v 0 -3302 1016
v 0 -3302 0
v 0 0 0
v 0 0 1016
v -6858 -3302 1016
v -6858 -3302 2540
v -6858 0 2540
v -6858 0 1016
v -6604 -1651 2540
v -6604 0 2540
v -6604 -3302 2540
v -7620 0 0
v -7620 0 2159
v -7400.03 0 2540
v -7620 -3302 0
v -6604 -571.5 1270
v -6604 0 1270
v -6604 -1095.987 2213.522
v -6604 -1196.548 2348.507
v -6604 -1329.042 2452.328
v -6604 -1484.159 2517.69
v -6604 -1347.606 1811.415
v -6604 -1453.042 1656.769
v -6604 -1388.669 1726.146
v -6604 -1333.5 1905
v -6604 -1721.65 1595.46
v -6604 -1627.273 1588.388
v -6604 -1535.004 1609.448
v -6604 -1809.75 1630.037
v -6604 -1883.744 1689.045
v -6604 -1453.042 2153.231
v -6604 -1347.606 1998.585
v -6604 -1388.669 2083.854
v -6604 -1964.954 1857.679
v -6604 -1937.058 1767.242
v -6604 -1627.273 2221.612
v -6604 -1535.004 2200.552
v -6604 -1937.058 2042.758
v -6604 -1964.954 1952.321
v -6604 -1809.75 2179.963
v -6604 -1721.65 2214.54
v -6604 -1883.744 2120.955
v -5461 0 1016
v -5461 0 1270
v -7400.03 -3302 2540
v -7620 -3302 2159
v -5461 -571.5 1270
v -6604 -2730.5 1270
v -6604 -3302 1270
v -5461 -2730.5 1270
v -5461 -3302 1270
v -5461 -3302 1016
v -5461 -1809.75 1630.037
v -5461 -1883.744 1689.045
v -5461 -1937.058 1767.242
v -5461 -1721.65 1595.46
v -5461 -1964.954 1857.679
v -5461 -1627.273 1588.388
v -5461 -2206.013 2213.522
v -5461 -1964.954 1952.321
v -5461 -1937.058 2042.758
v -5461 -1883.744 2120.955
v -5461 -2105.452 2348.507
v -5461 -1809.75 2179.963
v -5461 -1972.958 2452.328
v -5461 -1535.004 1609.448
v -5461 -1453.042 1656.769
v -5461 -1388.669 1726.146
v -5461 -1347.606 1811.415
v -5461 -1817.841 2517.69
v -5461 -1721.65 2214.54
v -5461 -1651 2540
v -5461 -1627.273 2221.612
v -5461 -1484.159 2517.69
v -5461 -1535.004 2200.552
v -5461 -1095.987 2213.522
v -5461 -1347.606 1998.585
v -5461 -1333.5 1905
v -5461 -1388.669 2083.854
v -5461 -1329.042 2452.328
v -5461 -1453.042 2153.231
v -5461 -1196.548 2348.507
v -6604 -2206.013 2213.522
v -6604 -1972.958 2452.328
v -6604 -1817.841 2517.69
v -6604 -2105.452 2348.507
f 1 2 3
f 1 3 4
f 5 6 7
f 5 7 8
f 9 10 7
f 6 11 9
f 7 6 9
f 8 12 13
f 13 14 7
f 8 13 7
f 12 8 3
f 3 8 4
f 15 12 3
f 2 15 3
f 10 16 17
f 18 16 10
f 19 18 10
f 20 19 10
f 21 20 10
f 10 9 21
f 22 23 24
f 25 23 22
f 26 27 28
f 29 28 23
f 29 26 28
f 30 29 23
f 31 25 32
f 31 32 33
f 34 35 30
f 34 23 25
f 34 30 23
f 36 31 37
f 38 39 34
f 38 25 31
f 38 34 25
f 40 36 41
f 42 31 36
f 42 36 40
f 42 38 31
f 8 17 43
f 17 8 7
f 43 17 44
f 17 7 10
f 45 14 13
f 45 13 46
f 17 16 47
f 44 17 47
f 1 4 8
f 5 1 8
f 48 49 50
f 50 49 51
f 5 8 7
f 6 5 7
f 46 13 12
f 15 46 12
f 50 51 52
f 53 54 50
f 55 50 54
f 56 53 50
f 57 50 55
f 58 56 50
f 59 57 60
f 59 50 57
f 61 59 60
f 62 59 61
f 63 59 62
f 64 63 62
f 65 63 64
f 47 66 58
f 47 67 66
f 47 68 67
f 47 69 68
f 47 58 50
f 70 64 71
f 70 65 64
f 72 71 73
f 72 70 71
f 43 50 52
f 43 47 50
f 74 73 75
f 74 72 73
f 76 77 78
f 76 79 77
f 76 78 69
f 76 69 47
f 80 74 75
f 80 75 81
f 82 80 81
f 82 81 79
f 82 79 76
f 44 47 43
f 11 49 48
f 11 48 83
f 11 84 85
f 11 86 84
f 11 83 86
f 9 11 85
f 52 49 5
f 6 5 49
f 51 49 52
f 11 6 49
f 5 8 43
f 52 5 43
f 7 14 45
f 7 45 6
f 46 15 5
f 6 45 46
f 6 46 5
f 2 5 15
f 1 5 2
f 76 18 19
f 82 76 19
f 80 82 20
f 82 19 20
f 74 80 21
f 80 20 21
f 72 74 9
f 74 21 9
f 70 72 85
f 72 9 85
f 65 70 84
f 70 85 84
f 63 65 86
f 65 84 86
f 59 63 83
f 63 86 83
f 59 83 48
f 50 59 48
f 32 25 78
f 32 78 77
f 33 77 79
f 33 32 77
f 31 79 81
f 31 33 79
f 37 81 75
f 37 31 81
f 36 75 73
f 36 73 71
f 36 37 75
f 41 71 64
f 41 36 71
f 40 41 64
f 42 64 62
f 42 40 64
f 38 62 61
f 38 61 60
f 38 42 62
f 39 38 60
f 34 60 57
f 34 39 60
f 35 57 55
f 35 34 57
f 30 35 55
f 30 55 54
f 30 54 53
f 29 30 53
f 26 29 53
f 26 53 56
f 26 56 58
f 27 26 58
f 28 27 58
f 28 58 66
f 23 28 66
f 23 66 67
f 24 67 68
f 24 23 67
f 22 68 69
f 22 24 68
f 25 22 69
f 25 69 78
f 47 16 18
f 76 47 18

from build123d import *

# Parameters (mm, degrees)
F0_W     = 762
F0_H     = 1524
F1_DEPTH = 3302
F2_SIZE2 = 219.9704525612
F2_SIZE  = 381
F3_W     = 1143
F3_H     = 254
F4_DEPTH = 3302
F5_R     = 317.5
F6_DEPTH = 1143


with BuildPart() as f1:
    # F0 (on Front) → F1 (new body)
    with BuildSketch(Plane.XZ):
        Polygon((-7620, 0), (0, 0), (0, 1016), (-6858, 1016), (-7620, 1016), align=None)
        with Locations((-7239, 1778)):
            Rectangle(F0_W, F0_H)
    extrude(amount=F1_DEPTH)

    # F2
    f2_edges = [f1.edges().sort_by_distance(p)[0] for p in [
        (-7620, -1651, 2540),
    ]]
    f2_side = f1.faces().sort_by_distance((-7620, -1651, 1270))[0]
    chamfer(f2_edges, length=F2_SIZE, length2=F2_SIZE2, reference=f2_side)


with BuildPart() as f4:
    # F3 (on face) → F4 (new body)
    with BuildSketch(Plane.XZ.offset(3302)):
        Polygon((-6604, 2540), (-6858, 2540), (-6858, 1016), (-6604, 1016), (-6604, 1270), align=None)
        with Locations((-6032.5, 1143)):
            Rectangle(F3_W, F3_H)
    extrude(amount=-F4_DEPTH)

    # F5 (on face) → F6 (join)
    with BuildSketch(Plane.YZ.offset(-6604)):
        with BuildLine():
            ThreePointArc((-1095.9871465296, 2213.5218508997), (-1036.3219696647, 2064.3609708277), (-1016, 1905))
            ThreePointArc((-1016, 1905), (-1201.9871939465, 1455.9871939466), (-1650.9999999999, 1270))
            Line((-1650.9999999999, 1270), (-571.5, 1270))
            Line((-571.5, 1270), (-1095.9871465296, 2213.5218508997))
        make_face()
        with BuildLine():
            Line((-2730.5, 1270), (-1650.9999999999, 1270))
            ThreePointArc((-1650.9999999999, 1270), (-2198.3282266252, 1583.0422196322), (-2206.0128534704, 2213.5218508997))
            Line((-2206.0128534704, 2213.5218508997), (-2730.5, 1270))
        make_face()
        with BuildLine():
            ThreePointArc((-1650.9999999999, 1270), (-1201.9871939465, 1455.9871939466), (-1016, 1905))
            ThreePointArc((-1016, 1905), (-1036.3219696647, 2064.3609708277), (-1095.9871465296, 2213.5218508997))
            ThreePointArc((-1095.9871465296, 2213.5218508997), (-1329.0422196322, 2452.3282266252), (-1651, 2540))
            ThreePointArc((-1651, 2540), (-1972.9577803678, 2452.3282266252), (-2206.0128534704, 2213.5218508997))
            ThreePointArc((-2206.0128534704, 2213.5218508997), (-2198.3282266252, 1583.0422196322), (-1650.9999999999, 1270))
        make_face()
        with Locations((-1651, 1905)):
            Circle(F5_R, mode=Mode.SUBTRACT)
    extrude(amount=F6_DEPTH)


solid = Compound([f1.part, f4.part])
